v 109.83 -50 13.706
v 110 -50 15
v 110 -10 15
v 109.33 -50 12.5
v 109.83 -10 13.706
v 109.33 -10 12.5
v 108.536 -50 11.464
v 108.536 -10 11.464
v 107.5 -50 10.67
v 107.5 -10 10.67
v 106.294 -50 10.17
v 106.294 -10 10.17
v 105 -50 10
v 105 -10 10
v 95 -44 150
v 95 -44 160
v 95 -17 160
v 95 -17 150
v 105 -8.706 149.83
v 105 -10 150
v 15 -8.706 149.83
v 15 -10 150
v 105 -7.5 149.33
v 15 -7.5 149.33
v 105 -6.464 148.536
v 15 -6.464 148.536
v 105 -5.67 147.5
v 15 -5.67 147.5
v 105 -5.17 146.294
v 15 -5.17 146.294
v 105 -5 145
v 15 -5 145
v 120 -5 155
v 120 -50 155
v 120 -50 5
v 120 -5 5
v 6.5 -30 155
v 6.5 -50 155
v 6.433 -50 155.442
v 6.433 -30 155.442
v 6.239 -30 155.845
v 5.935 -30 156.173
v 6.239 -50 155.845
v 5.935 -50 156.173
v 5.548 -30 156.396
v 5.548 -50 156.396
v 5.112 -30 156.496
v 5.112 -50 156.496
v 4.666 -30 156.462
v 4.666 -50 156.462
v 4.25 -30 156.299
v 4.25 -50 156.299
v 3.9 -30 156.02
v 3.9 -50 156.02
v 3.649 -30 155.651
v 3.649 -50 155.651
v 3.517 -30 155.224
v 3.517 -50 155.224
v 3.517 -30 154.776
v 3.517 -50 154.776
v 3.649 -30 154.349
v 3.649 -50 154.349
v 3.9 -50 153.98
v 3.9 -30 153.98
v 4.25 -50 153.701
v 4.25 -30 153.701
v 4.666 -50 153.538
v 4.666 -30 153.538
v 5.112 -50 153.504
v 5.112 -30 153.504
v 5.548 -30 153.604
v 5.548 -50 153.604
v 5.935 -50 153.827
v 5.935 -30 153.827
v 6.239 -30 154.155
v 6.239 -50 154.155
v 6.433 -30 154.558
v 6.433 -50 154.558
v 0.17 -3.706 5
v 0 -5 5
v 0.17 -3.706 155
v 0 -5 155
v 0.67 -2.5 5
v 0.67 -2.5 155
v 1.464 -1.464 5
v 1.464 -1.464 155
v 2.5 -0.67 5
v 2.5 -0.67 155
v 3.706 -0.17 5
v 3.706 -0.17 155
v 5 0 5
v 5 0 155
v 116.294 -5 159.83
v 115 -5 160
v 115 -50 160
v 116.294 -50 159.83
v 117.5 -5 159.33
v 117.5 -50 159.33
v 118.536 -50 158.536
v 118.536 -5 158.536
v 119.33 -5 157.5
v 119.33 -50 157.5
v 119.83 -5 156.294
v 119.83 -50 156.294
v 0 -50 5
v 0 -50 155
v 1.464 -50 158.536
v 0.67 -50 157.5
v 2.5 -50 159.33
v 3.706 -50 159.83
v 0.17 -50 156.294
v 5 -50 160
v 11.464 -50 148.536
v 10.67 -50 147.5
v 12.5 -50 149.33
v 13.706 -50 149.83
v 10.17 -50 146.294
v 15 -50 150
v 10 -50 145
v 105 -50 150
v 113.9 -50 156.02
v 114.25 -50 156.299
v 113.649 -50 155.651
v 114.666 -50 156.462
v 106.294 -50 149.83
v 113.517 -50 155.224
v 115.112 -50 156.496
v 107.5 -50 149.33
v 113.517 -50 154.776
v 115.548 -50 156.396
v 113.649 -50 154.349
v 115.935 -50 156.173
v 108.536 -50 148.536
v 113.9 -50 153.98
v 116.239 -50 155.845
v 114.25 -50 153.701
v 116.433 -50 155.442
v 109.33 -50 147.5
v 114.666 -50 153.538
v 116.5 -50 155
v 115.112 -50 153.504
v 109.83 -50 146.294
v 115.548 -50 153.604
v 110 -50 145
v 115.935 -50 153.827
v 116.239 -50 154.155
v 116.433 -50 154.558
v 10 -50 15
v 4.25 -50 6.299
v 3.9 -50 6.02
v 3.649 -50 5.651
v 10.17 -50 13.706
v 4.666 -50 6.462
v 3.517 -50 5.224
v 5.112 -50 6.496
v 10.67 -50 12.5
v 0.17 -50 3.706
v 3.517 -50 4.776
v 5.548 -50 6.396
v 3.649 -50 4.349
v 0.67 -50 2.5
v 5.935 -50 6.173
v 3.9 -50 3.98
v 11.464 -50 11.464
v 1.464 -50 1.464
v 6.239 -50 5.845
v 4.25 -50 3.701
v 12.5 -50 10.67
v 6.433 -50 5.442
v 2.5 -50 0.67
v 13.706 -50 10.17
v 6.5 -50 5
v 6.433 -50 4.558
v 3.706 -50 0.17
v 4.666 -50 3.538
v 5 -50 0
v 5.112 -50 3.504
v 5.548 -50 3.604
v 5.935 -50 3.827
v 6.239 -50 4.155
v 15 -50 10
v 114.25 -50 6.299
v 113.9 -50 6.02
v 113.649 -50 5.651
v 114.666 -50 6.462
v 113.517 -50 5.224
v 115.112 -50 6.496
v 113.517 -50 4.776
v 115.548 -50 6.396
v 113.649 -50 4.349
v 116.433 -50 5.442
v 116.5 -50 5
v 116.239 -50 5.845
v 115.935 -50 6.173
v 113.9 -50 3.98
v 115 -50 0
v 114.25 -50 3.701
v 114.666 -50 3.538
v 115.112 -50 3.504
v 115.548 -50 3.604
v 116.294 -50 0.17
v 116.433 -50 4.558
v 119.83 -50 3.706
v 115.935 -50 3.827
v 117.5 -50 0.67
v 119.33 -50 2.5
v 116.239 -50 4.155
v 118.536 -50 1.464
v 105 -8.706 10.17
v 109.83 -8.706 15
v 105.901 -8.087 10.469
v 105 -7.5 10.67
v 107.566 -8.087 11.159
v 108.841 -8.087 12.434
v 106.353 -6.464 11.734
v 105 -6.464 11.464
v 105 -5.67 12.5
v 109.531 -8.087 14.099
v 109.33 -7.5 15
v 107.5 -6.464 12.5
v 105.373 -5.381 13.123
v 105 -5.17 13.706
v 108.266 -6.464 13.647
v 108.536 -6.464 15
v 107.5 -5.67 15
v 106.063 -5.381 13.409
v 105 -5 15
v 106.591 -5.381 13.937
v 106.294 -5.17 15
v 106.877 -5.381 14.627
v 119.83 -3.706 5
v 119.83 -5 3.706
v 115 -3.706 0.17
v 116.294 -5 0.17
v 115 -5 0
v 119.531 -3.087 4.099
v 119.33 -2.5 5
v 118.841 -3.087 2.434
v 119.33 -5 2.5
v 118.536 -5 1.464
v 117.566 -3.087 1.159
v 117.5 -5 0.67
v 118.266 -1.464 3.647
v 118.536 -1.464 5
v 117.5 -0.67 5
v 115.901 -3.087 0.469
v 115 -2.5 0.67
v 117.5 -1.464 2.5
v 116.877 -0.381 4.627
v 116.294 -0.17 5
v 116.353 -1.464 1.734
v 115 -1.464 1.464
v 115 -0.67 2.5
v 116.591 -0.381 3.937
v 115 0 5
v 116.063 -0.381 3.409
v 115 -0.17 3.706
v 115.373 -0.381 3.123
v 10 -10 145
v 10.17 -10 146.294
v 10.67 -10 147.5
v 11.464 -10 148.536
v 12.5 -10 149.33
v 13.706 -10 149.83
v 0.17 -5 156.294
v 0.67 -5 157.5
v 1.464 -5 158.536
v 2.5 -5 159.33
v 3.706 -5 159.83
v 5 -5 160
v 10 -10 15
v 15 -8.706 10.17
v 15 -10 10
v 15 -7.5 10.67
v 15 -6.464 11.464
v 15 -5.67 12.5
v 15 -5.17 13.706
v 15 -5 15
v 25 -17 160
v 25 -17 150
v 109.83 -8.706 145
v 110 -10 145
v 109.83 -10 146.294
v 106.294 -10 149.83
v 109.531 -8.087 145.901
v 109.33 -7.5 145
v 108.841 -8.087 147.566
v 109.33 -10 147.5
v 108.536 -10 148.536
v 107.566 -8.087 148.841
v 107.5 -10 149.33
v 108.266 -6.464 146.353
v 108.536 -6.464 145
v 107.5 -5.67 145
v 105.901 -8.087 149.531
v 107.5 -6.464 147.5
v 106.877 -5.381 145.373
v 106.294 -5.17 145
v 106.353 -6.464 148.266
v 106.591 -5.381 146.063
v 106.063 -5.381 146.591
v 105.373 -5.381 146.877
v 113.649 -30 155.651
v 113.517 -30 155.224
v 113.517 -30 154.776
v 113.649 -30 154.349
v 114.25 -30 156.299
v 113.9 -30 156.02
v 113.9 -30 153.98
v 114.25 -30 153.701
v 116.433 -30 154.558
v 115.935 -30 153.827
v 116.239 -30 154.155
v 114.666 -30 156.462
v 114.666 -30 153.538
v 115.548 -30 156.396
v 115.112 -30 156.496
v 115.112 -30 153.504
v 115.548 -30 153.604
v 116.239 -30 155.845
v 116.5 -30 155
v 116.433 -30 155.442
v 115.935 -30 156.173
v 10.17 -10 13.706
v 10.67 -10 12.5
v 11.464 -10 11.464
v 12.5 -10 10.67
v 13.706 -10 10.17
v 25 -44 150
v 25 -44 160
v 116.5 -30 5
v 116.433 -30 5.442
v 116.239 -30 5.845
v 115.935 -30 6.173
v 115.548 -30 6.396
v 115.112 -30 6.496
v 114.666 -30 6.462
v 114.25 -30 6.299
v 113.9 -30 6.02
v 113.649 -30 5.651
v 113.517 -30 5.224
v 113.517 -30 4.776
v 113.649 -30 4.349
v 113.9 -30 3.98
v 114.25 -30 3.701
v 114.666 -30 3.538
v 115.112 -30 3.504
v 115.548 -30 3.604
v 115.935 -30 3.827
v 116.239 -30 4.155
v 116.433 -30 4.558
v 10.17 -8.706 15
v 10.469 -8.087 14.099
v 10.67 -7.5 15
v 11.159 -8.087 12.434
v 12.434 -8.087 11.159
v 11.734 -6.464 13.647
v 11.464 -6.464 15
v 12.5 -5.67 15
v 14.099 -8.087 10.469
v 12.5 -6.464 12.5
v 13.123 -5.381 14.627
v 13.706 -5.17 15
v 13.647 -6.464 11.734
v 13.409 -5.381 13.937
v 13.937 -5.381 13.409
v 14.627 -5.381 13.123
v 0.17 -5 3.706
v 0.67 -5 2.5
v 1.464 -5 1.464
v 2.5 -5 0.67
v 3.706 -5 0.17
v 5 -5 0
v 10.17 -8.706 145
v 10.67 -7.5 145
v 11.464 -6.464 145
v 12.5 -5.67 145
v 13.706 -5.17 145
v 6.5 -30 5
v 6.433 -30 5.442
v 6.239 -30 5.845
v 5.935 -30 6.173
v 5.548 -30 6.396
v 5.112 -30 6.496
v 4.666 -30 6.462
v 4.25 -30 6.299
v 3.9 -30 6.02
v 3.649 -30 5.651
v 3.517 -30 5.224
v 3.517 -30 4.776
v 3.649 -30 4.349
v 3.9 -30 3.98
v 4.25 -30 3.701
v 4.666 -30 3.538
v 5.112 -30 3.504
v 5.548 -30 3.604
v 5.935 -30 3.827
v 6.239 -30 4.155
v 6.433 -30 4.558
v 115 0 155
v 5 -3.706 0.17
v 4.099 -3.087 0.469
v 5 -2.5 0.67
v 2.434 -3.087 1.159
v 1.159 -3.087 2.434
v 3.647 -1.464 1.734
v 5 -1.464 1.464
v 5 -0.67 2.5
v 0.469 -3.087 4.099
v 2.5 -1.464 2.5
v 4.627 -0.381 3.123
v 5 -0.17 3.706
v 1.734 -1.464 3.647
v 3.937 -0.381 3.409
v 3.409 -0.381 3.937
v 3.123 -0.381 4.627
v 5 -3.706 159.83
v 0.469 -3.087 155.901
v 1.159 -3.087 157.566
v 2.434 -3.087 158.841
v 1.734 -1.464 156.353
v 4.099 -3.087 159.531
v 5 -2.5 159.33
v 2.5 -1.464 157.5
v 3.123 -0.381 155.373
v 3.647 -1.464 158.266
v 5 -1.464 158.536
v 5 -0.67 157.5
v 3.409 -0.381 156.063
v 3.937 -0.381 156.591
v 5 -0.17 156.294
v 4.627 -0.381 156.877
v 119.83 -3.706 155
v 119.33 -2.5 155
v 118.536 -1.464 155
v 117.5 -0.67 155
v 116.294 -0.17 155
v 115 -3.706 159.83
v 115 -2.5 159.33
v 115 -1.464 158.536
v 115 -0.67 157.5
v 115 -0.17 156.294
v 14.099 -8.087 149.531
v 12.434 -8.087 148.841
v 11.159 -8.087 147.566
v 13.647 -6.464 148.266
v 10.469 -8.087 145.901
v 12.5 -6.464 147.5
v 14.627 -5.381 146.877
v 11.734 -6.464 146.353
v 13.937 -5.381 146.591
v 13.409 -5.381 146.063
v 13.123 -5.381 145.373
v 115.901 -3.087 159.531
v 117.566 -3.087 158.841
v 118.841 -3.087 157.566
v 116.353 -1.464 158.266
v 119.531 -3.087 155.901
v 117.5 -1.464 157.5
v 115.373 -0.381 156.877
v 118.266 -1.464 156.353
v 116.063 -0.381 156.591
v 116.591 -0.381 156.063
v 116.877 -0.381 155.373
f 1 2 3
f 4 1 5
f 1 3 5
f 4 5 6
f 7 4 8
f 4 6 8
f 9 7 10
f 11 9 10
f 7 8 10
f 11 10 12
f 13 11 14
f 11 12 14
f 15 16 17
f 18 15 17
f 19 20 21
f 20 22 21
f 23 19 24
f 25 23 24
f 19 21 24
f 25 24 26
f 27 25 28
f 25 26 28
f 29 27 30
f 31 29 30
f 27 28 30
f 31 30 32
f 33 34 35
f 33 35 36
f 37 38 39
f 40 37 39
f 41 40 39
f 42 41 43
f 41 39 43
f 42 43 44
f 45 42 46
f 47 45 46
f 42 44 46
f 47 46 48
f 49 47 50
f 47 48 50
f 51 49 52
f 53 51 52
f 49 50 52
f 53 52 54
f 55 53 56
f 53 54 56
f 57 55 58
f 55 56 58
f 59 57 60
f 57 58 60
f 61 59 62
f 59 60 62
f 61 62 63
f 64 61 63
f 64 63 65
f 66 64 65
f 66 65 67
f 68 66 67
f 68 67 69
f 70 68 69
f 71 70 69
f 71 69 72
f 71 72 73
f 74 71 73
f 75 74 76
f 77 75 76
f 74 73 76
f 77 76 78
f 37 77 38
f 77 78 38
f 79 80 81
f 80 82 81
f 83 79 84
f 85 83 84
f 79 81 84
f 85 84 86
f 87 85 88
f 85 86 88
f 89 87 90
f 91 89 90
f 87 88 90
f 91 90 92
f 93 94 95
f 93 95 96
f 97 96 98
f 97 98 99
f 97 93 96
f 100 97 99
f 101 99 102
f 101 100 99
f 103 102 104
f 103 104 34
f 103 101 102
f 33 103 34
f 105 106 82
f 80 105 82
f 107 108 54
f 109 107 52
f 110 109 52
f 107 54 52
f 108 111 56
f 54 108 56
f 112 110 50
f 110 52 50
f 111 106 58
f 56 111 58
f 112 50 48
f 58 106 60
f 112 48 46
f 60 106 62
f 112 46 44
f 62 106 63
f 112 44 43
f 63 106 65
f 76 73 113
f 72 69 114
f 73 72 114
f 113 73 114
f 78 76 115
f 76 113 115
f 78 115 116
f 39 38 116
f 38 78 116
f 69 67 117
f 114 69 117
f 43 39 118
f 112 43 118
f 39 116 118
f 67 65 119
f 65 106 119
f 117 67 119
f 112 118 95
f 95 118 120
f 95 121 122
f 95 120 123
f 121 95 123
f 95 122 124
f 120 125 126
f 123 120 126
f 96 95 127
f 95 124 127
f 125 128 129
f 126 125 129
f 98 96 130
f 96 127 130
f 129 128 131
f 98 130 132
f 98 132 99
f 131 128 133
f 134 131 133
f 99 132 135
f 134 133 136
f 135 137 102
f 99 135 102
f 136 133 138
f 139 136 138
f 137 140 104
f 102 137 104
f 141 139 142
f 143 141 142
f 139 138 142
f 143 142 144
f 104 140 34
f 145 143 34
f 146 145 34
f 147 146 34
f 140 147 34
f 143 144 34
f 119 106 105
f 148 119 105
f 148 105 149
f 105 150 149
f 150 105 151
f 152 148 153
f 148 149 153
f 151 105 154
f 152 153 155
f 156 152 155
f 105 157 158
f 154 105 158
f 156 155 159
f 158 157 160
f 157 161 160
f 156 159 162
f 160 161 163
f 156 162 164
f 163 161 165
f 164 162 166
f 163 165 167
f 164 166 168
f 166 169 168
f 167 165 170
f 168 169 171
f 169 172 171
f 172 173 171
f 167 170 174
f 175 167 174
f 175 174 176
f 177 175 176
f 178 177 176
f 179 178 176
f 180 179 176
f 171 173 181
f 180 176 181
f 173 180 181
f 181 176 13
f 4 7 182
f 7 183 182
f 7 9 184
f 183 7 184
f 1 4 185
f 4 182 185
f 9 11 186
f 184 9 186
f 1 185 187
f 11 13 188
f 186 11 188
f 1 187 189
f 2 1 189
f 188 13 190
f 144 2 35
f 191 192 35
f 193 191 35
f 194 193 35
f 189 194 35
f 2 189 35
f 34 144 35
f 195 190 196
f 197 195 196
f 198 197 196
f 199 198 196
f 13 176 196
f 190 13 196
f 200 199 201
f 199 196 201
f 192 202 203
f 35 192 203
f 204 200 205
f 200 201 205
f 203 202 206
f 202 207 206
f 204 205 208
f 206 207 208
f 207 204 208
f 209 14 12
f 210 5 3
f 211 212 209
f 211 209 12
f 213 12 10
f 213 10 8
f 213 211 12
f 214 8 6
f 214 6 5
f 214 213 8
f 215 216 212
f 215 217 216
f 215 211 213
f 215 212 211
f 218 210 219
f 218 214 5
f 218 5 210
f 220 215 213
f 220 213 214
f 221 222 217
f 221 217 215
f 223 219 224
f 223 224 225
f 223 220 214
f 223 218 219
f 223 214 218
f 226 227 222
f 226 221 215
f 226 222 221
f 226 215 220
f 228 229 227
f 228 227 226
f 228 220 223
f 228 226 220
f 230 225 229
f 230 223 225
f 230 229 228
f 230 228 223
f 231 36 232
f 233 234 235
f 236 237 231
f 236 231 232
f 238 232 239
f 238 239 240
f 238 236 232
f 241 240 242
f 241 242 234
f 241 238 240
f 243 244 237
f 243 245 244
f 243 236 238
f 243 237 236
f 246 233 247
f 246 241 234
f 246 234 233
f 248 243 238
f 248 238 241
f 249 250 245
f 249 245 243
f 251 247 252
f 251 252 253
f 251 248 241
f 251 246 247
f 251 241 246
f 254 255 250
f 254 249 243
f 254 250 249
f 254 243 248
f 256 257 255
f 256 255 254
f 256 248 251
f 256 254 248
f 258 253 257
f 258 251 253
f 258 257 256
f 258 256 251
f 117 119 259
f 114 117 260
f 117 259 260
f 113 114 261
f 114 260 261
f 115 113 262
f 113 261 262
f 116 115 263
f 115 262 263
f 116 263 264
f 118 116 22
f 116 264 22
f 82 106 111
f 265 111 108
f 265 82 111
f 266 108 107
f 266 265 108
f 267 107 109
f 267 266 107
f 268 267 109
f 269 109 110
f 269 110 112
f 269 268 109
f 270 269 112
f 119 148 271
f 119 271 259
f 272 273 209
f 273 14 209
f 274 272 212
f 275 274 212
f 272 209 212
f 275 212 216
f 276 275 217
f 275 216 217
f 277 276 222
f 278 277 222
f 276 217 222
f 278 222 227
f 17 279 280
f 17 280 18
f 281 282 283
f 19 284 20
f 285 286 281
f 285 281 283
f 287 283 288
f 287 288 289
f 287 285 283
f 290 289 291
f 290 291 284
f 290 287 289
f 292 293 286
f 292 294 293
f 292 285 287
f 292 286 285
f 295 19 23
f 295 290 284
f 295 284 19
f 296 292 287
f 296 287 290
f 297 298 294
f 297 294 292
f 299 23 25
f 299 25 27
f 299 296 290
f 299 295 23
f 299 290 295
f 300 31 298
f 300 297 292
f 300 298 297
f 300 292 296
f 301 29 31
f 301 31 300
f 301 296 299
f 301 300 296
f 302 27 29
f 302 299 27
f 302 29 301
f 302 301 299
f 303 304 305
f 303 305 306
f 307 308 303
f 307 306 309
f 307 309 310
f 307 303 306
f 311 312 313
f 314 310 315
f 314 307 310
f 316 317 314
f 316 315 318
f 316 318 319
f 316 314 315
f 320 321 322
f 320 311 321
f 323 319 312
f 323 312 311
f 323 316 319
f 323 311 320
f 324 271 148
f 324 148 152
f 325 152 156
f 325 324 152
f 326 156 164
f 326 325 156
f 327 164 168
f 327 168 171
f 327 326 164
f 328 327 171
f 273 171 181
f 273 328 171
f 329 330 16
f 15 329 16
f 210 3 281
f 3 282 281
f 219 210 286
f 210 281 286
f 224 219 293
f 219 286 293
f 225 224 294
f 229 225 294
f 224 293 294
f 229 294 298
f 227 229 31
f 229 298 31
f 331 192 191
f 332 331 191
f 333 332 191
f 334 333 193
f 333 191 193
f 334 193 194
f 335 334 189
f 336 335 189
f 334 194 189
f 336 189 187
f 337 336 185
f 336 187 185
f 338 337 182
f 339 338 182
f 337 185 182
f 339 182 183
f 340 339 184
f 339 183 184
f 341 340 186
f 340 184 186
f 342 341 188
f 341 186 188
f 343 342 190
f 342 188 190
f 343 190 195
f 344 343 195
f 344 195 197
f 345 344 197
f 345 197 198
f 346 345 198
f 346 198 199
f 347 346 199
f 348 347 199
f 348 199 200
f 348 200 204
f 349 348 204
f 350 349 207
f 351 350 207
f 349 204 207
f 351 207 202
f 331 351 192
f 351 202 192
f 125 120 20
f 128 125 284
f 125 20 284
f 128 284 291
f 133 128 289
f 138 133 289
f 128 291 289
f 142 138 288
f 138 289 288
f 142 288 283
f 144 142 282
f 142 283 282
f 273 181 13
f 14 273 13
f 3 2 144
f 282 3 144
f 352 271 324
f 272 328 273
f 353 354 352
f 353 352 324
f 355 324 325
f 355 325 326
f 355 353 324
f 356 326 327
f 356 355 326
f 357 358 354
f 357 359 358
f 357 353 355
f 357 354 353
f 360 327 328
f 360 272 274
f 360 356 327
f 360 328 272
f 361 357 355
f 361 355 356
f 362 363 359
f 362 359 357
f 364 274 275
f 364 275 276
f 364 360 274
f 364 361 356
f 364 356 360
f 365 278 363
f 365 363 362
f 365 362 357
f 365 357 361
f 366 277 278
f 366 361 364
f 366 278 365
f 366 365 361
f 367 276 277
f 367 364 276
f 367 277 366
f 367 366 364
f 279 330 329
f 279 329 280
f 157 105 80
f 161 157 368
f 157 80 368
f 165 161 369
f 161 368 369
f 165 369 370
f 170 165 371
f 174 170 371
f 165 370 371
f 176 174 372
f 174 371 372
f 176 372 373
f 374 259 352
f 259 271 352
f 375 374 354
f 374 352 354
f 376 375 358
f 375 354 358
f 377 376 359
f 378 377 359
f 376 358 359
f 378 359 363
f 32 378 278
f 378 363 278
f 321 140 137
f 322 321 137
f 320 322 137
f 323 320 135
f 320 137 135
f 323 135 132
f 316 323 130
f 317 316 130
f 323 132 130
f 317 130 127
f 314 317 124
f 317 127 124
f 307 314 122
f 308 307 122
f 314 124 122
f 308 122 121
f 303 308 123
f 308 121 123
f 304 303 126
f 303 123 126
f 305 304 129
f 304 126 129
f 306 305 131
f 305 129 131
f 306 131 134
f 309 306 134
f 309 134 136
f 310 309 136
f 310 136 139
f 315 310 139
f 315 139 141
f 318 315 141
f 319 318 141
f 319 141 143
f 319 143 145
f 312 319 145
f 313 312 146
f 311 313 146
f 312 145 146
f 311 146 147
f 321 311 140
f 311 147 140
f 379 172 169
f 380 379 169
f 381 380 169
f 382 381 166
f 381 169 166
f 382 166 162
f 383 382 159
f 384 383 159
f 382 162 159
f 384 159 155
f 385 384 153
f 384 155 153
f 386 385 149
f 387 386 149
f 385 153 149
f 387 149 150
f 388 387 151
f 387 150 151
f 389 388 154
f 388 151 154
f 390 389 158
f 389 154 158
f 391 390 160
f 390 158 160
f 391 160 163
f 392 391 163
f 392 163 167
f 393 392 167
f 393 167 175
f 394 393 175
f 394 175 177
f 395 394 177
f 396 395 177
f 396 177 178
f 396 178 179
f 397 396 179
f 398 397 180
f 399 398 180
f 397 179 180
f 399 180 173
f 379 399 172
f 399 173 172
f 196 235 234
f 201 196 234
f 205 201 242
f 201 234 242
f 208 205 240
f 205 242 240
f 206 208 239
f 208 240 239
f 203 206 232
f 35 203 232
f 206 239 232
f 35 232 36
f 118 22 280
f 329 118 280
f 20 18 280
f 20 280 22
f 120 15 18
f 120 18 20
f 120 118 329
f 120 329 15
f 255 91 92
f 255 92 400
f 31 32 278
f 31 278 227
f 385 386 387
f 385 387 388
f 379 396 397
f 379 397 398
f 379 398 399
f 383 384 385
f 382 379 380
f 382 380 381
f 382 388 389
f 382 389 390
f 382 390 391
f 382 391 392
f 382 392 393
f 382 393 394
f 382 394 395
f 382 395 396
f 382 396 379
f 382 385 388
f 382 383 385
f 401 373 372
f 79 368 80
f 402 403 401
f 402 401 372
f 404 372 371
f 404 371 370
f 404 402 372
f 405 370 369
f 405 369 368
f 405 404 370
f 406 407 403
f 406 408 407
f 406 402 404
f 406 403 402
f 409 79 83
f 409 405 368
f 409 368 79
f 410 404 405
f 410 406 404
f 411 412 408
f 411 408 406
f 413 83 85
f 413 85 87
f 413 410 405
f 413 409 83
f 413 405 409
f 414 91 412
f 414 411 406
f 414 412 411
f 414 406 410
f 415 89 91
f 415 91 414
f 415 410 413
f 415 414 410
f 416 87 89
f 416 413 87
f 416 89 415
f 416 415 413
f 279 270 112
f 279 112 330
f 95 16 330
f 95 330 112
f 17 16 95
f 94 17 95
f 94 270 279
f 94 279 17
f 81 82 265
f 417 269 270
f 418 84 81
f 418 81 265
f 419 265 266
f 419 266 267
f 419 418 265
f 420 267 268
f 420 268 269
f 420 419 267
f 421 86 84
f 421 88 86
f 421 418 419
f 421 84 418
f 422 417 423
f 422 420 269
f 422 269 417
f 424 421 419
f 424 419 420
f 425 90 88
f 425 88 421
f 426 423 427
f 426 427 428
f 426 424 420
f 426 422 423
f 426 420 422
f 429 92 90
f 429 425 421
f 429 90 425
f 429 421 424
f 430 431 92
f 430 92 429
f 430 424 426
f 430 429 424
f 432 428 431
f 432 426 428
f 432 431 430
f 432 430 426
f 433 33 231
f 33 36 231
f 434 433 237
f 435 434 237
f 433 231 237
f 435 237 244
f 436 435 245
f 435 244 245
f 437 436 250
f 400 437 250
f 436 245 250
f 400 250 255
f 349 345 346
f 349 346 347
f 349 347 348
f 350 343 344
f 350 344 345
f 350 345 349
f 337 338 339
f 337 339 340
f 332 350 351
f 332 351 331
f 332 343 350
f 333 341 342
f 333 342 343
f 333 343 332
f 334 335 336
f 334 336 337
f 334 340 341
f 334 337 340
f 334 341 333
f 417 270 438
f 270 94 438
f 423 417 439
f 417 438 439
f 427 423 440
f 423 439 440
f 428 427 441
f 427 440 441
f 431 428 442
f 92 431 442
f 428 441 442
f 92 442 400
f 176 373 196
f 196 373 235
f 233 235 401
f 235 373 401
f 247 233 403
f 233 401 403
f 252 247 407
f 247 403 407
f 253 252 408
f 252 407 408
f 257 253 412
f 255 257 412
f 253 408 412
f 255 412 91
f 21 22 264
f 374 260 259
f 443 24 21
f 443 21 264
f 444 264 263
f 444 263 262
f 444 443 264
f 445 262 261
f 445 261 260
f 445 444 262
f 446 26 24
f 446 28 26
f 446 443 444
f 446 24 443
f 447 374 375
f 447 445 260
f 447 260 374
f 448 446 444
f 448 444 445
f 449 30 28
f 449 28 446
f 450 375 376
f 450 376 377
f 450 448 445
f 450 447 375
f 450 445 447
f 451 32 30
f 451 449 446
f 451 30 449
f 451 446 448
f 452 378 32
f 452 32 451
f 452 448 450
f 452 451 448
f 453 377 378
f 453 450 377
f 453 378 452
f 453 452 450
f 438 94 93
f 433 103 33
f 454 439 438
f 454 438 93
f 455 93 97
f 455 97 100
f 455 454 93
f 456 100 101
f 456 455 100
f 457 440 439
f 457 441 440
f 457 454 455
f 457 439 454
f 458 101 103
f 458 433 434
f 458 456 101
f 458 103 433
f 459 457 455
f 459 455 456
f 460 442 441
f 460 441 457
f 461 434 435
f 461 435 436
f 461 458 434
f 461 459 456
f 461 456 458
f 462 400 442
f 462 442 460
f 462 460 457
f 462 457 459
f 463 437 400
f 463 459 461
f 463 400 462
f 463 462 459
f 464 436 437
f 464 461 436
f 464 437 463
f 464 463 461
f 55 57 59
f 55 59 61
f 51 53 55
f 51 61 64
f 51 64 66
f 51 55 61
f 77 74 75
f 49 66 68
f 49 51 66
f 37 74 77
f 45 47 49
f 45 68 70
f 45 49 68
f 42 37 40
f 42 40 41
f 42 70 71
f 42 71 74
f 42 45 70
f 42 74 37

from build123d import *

# Parameters (mm, degrees)
SKETCH1_W           = 120
SKETCH1_H           = 50
BOSS_EXTRUDE1_DEPTH = 160
FILLET1_R           = 5
FILLET2_R           = 5
SKETCH2_W           = 100
SKETCH2_H           = 140
CUT_EXTRUDE1_DEPTH  = 45
FILLET3_R           = 5
FILLET4_R           = 5
FILLET5_R           = 5
SKETCH3_R           = 1.5
CUT_EXTRUDE2_DEPTH  = 20
SKETCH4_W           = 70
SKETCH4_H           = 27
CUT_EXTRUDE4_DEPTH  = 20


with BuildPart() as part:
    # Sketch1 → Boss-Extrude1 (new body)
    with BuildSketch(Plane.XY):
        with Locations((60, -25)):
            Rectangle(SKETCH1_W, SKETCH1_H)
    extrude(amount=BOSS_EXTRUDE1_DEPTH)

    # Fillet1
    fillet1_edges = [part.edges().sort_by_distance(p)[0] for p in [
        (0, -25, 160),
    ]]
    fillet(fillet1_edges, radius=FILLET1_R)

    # Fillet2
    fillet2_edges = [part.edges().sort_by_distance(p)[0] for p in [
        (120, -25, 160),
        (120, -25, 0),
        (0, -25, 0),
    ]]
    fillet(fillet2_edges, radius=FILLET2_R)

    # Sketch2 → Cut-Extrude1 (cut)
    with BuildSketch(Plane.XZ.offset(50)):
        with Locations((60, 80)):
            Rectangle(SKETCH2_W, SKETCH2_H)
    extrude(amount=-CUT_EXTRUDE1_DEPTH, mode=Mode.SUBTRACT)

    # Fillet3
    fillet3_edges = [part.edges().sort_by_distance(p)[0] for p in [
        (10, -27.5, 10),
        (10, -27.5, 150),
        (110, -27.5, 150),
        (110, -27.5, 10),
    ]]
    fillet(fillet3_edges, radius=FILLET3_R)

    # Fillet4
    fillet4_edges = [part.edges().sort_by_distance(p)[0] for p in [
        (110, -5, 80),
        (60, -5, 10),
        (10, -5, 80),
        (60, -5, 150),
        (11.464466094, -5, 148.535533906),
        (108.535533906, -5, 148.535533906),
        (11.464466094, -5, 11.464466094),
        (108.535533906, -5, 11.464466094),
    ]]
    fillet(fillet4_edges, radius=FILLET4_R)

    # Fillet5
    fillet5_edges = [part.edges().sort_by_distance(p)[0] for p in [
        (0, 0, 80),
        (1.464466094, 0, 158.535533906),
        (60, 0, 0),
        (60, 0, 160),
        (120, 0, 80),
        (118.535533906, 0, 158.535533906),
        (118.535533906, 0, 1.464466094),
        (1.464466094, 0, 1.464466094),
    ]]
    fillet(fillet5_edges, radius=FILLET5_R)

    # Sketch3 → Cut-Extrude2 (cut)
    with BuildSketch(Plane.XZ.offset(50)):
        with Locations((5, 155)):
            Circle(SKETCH3_R)
        with Locations((115, 155)):
            Circle(SKETCH3_R)
        with Locations((115, 5)):
            Circle(SKETCH3_R)
        with Locations((5, 5)):
            Circle(SKETCH3_R)
    extrude(amount=-CUT_EXTRUDE2_DEPTH, mode=Mode.SUBTRACT)

    # Sketch4 → Cut-Extrude4 (cut)
    with BuildSketch(Plane.XY.offset(160)):
        with Locations((60, -30.5)):
            Rectangle(SKETCH4_W, SKETCH4_H)
    extrude(amount=-CUT_EXTRUDE4_DEPTH, mode=Mode.SUBTRACT)


solid = part.part
